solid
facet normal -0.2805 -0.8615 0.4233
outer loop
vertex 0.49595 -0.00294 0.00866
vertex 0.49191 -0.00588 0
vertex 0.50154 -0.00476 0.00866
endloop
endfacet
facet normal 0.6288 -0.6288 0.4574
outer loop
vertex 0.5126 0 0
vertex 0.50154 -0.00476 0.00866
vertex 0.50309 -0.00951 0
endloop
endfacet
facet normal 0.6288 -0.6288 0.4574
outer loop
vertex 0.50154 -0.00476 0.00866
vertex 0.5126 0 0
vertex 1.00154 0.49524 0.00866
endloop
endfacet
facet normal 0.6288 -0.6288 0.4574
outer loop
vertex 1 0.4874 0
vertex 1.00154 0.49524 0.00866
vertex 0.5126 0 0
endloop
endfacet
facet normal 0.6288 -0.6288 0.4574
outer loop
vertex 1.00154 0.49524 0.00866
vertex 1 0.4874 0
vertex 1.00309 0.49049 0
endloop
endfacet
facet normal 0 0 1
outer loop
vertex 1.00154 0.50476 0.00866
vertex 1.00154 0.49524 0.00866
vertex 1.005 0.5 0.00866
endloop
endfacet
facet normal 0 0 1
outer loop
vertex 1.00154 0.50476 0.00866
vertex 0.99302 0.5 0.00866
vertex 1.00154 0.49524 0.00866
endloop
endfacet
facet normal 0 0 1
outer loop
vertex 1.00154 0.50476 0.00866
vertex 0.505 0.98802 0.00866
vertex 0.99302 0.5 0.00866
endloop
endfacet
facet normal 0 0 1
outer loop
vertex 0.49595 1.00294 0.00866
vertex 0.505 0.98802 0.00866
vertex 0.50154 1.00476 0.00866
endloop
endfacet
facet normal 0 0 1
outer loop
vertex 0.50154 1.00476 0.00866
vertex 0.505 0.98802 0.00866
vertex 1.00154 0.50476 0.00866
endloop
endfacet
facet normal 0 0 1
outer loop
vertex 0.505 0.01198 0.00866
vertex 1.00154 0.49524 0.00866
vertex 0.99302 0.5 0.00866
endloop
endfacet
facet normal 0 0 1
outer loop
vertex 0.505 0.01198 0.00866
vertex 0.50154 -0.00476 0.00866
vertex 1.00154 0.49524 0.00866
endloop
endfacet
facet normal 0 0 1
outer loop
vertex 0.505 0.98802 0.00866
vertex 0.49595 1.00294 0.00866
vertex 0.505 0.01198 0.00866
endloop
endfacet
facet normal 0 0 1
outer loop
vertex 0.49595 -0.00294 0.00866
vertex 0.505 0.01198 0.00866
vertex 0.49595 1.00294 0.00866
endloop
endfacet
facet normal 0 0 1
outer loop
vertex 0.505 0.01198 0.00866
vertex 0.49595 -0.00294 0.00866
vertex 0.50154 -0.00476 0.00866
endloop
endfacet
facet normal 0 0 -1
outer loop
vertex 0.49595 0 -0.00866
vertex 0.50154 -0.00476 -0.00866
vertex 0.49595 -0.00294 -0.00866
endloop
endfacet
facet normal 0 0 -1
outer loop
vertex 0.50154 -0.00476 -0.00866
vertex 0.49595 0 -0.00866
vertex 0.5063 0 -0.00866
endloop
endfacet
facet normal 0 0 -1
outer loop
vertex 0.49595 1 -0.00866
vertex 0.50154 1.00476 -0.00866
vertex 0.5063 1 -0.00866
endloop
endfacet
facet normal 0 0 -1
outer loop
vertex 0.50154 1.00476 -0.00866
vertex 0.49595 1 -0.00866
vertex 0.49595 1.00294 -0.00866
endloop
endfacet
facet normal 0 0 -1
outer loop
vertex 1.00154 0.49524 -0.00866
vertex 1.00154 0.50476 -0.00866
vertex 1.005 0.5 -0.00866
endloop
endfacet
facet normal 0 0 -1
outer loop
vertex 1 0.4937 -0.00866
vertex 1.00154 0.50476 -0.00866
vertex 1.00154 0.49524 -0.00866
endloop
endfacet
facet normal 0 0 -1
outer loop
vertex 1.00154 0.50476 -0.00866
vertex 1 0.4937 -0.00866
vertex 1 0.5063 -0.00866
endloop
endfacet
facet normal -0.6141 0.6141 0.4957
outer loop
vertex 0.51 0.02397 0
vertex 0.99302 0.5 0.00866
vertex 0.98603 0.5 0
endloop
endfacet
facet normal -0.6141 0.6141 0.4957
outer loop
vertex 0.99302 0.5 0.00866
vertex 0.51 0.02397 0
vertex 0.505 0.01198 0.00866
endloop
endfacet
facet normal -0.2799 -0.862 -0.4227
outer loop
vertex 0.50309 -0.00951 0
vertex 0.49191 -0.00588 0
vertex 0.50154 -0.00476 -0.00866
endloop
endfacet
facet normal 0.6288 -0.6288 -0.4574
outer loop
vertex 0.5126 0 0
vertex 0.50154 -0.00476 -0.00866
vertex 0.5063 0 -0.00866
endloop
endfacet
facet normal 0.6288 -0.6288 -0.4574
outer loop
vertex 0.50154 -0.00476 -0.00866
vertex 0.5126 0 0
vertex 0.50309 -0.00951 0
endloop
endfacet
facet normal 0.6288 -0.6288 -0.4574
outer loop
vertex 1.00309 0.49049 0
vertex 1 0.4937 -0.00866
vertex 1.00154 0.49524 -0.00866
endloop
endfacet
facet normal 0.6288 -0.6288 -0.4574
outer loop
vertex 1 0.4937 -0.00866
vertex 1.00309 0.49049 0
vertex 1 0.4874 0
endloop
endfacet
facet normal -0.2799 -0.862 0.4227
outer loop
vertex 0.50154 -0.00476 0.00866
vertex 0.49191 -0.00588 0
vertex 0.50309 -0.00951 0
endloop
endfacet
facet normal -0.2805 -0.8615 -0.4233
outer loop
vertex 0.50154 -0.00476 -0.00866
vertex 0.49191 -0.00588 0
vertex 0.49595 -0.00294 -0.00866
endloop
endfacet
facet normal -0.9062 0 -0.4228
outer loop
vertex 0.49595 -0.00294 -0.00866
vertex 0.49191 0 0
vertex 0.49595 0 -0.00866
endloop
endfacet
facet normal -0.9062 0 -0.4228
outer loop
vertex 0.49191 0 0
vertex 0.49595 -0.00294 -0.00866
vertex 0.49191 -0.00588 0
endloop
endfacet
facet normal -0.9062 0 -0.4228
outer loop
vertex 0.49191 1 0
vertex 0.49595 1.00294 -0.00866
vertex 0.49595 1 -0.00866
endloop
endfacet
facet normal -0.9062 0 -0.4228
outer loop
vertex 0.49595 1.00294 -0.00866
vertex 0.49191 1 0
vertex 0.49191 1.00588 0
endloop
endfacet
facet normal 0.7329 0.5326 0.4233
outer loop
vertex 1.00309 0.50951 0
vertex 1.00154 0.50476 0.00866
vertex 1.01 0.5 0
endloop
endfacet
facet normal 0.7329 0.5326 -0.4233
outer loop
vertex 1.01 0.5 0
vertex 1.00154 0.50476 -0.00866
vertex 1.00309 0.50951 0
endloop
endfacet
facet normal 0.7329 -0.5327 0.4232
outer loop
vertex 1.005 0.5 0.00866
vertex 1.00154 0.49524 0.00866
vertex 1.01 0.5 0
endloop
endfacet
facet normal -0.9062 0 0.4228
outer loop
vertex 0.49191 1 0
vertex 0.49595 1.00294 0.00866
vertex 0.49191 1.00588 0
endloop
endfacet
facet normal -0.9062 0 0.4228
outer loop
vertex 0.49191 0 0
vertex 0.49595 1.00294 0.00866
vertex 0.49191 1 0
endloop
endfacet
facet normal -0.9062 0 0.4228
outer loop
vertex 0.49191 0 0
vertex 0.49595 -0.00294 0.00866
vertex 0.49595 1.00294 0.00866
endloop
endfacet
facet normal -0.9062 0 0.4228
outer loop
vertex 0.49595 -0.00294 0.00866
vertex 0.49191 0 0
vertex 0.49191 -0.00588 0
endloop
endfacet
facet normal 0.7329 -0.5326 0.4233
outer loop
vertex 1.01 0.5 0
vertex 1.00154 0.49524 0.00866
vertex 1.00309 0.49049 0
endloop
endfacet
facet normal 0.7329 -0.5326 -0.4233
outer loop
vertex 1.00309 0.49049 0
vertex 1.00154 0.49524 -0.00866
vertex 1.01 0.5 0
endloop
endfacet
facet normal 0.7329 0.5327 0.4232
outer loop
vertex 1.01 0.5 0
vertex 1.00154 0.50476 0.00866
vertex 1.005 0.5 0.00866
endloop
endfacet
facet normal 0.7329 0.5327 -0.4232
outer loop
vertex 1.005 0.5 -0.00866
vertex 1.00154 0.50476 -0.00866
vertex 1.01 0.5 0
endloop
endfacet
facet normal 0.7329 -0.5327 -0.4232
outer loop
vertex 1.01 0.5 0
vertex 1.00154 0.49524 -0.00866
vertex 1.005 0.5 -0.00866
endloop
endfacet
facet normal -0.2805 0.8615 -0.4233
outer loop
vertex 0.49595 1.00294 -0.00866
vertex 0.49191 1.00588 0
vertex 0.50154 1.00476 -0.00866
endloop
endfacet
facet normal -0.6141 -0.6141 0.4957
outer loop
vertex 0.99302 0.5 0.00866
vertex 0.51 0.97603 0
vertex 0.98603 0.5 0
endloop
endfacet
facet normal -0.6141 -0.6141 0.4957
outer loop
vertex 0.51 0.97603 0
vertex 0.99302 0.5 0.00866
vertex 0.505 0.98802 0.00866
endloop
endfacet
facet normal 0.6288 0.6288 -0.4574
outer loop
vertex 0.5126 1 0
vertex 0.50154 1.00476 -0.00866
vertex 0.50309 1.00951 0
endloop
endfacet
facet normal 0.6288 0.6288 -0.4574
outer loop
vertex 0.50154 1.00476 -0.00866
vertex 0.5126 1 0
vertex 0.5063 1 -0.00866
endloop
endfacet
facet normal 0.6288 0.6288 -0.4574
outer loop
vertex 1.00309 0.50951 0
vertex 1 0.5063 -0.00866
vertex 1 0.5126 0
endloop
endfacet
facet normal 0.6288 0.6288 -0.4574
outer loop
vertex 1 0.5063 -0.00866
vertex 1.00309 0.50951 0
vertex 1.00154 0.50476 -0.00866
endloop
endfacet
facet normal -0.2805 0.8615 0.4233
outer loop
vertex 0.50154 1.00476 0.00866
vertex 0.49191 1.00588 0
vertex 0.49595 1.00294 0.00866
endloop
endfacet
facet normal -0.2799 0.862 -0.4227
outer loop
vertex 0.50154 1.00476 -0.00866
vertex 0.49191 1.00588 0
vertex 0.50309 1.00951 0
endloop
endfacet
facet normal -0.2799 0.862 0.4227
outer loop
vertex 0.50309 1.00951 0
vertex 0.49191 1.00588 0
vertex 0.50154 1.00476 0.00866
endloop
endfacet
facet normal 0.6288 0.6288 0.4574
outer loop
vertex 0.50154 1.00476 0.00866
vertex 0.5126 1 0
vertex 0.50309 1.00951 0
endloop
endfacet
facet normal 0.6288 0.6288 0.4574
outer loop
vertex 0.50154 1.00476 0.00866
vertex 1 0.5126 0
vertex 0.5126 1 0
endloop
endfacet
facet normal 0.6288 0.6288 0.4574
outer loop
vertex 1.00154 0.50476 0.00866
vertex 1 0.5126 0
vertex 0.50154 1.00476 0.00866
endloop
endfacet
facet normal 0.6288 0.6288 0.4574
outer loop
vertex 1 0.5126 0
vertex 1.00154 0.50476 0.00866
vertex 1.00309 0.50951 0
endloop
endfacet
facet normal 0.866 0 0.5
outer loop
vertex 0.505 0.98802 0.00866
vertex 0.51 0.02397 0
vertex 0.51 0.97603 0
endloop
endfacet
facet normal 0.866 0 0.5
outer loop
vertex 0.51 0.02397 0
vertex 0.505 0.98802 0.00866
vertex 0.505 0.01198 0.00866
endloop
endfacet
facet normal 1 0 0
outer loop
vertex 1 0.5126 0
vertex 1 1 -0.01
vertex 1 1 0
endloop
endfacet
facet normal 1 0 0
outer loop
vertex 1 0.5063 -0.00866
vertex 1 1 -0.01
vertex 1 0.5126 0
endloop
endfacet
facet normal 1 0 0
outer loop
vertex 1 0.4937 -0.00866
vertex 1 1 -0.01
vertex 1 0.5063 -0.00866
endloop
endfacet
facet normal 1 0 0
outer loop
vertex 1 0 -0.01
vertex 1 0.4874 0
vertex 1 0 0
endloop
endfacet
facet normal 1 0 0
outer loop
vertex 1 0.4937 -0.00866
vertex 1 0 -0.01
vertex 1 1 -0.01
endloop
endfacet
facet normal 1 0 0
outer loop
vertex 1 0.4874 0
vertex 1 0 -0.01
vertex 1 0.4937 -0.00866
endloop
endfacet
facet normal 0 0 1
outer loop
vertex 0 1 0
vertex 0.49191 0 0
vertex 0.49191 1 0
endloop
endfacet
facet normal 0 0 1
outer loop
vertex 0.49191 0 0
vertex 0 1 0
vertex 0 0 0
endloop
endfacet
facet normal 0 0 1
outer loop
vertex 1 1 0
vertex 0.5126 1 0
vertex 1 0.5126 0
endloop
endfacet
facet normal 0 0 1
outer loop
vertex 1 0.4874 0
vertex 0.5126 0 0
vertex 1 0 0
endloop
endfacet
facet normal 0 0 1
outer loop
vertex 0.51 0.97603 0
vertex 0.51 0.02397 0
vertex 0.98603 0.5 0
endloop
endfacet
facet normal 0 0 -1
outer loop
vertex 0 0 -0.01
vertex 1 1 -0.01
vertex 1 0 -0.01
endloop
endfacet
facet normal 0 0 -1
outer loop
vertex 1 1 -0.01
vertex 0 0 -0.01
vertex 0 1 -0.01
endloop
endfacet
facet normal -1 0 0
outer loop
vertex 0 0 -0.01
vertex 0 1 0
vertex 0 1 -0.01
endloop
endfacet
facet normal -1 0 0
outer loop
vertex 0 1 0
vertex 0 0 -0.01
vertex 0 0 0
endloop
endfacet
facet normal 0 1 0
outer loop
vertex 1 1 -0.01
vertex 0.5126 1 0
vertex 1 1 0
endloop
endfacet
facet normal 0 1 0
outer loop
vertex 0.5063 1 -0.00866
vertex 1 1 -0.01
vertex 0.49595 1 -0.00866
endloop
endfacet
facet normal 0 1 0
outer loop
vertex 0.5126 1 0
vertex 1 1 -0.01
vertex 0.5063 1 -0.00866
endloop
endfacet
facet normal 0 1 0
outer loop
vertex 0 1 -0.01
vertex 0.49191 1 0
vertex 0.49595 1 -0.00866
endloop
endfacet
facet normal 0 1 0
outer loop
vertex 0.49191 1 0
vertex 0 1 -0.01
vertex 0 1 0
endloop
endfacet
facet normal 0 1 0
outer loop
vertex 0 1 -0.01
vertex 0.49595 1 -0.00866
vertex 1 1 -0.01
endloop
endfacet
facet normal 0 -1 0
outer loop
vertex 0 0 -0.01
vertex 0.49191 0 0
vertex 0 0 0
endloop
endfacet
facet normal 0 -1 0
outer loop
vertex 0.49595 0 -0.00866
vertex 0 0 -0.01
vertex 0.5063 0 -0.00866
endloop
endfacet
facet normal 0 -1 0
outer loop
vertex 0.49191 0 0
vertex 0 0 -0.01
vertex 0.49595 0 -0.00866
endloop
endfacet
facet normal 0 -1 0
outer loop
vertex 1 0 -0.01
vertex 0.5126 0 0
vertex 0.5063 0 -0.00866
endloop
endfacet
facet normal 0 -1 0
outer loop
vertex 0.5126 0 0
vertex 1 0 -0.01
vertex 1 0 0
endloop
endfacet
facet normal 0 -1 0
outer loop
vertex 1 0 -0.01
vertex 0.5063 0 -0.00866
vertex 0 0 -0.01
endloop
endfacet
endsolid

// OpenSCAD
hull(){
    translate([0.5, 0.0]) sphere(0.01);
    translate([1.0, 0.5]) sphere(0.01);
}
hull(){
    translate([1.0, 0.5]) sphere(0.01);
    translate([0.5, 1.0]) sphere(0.01);
}
hull(){
    translate([0.5, 1.0]) sphere(0.01);
    translate([0.5, 0.0]) sphere(0.01);
}
translate([0,0,-0.01]) color([0.1,0.1,0.1]) cube([1,1,0.01]);
